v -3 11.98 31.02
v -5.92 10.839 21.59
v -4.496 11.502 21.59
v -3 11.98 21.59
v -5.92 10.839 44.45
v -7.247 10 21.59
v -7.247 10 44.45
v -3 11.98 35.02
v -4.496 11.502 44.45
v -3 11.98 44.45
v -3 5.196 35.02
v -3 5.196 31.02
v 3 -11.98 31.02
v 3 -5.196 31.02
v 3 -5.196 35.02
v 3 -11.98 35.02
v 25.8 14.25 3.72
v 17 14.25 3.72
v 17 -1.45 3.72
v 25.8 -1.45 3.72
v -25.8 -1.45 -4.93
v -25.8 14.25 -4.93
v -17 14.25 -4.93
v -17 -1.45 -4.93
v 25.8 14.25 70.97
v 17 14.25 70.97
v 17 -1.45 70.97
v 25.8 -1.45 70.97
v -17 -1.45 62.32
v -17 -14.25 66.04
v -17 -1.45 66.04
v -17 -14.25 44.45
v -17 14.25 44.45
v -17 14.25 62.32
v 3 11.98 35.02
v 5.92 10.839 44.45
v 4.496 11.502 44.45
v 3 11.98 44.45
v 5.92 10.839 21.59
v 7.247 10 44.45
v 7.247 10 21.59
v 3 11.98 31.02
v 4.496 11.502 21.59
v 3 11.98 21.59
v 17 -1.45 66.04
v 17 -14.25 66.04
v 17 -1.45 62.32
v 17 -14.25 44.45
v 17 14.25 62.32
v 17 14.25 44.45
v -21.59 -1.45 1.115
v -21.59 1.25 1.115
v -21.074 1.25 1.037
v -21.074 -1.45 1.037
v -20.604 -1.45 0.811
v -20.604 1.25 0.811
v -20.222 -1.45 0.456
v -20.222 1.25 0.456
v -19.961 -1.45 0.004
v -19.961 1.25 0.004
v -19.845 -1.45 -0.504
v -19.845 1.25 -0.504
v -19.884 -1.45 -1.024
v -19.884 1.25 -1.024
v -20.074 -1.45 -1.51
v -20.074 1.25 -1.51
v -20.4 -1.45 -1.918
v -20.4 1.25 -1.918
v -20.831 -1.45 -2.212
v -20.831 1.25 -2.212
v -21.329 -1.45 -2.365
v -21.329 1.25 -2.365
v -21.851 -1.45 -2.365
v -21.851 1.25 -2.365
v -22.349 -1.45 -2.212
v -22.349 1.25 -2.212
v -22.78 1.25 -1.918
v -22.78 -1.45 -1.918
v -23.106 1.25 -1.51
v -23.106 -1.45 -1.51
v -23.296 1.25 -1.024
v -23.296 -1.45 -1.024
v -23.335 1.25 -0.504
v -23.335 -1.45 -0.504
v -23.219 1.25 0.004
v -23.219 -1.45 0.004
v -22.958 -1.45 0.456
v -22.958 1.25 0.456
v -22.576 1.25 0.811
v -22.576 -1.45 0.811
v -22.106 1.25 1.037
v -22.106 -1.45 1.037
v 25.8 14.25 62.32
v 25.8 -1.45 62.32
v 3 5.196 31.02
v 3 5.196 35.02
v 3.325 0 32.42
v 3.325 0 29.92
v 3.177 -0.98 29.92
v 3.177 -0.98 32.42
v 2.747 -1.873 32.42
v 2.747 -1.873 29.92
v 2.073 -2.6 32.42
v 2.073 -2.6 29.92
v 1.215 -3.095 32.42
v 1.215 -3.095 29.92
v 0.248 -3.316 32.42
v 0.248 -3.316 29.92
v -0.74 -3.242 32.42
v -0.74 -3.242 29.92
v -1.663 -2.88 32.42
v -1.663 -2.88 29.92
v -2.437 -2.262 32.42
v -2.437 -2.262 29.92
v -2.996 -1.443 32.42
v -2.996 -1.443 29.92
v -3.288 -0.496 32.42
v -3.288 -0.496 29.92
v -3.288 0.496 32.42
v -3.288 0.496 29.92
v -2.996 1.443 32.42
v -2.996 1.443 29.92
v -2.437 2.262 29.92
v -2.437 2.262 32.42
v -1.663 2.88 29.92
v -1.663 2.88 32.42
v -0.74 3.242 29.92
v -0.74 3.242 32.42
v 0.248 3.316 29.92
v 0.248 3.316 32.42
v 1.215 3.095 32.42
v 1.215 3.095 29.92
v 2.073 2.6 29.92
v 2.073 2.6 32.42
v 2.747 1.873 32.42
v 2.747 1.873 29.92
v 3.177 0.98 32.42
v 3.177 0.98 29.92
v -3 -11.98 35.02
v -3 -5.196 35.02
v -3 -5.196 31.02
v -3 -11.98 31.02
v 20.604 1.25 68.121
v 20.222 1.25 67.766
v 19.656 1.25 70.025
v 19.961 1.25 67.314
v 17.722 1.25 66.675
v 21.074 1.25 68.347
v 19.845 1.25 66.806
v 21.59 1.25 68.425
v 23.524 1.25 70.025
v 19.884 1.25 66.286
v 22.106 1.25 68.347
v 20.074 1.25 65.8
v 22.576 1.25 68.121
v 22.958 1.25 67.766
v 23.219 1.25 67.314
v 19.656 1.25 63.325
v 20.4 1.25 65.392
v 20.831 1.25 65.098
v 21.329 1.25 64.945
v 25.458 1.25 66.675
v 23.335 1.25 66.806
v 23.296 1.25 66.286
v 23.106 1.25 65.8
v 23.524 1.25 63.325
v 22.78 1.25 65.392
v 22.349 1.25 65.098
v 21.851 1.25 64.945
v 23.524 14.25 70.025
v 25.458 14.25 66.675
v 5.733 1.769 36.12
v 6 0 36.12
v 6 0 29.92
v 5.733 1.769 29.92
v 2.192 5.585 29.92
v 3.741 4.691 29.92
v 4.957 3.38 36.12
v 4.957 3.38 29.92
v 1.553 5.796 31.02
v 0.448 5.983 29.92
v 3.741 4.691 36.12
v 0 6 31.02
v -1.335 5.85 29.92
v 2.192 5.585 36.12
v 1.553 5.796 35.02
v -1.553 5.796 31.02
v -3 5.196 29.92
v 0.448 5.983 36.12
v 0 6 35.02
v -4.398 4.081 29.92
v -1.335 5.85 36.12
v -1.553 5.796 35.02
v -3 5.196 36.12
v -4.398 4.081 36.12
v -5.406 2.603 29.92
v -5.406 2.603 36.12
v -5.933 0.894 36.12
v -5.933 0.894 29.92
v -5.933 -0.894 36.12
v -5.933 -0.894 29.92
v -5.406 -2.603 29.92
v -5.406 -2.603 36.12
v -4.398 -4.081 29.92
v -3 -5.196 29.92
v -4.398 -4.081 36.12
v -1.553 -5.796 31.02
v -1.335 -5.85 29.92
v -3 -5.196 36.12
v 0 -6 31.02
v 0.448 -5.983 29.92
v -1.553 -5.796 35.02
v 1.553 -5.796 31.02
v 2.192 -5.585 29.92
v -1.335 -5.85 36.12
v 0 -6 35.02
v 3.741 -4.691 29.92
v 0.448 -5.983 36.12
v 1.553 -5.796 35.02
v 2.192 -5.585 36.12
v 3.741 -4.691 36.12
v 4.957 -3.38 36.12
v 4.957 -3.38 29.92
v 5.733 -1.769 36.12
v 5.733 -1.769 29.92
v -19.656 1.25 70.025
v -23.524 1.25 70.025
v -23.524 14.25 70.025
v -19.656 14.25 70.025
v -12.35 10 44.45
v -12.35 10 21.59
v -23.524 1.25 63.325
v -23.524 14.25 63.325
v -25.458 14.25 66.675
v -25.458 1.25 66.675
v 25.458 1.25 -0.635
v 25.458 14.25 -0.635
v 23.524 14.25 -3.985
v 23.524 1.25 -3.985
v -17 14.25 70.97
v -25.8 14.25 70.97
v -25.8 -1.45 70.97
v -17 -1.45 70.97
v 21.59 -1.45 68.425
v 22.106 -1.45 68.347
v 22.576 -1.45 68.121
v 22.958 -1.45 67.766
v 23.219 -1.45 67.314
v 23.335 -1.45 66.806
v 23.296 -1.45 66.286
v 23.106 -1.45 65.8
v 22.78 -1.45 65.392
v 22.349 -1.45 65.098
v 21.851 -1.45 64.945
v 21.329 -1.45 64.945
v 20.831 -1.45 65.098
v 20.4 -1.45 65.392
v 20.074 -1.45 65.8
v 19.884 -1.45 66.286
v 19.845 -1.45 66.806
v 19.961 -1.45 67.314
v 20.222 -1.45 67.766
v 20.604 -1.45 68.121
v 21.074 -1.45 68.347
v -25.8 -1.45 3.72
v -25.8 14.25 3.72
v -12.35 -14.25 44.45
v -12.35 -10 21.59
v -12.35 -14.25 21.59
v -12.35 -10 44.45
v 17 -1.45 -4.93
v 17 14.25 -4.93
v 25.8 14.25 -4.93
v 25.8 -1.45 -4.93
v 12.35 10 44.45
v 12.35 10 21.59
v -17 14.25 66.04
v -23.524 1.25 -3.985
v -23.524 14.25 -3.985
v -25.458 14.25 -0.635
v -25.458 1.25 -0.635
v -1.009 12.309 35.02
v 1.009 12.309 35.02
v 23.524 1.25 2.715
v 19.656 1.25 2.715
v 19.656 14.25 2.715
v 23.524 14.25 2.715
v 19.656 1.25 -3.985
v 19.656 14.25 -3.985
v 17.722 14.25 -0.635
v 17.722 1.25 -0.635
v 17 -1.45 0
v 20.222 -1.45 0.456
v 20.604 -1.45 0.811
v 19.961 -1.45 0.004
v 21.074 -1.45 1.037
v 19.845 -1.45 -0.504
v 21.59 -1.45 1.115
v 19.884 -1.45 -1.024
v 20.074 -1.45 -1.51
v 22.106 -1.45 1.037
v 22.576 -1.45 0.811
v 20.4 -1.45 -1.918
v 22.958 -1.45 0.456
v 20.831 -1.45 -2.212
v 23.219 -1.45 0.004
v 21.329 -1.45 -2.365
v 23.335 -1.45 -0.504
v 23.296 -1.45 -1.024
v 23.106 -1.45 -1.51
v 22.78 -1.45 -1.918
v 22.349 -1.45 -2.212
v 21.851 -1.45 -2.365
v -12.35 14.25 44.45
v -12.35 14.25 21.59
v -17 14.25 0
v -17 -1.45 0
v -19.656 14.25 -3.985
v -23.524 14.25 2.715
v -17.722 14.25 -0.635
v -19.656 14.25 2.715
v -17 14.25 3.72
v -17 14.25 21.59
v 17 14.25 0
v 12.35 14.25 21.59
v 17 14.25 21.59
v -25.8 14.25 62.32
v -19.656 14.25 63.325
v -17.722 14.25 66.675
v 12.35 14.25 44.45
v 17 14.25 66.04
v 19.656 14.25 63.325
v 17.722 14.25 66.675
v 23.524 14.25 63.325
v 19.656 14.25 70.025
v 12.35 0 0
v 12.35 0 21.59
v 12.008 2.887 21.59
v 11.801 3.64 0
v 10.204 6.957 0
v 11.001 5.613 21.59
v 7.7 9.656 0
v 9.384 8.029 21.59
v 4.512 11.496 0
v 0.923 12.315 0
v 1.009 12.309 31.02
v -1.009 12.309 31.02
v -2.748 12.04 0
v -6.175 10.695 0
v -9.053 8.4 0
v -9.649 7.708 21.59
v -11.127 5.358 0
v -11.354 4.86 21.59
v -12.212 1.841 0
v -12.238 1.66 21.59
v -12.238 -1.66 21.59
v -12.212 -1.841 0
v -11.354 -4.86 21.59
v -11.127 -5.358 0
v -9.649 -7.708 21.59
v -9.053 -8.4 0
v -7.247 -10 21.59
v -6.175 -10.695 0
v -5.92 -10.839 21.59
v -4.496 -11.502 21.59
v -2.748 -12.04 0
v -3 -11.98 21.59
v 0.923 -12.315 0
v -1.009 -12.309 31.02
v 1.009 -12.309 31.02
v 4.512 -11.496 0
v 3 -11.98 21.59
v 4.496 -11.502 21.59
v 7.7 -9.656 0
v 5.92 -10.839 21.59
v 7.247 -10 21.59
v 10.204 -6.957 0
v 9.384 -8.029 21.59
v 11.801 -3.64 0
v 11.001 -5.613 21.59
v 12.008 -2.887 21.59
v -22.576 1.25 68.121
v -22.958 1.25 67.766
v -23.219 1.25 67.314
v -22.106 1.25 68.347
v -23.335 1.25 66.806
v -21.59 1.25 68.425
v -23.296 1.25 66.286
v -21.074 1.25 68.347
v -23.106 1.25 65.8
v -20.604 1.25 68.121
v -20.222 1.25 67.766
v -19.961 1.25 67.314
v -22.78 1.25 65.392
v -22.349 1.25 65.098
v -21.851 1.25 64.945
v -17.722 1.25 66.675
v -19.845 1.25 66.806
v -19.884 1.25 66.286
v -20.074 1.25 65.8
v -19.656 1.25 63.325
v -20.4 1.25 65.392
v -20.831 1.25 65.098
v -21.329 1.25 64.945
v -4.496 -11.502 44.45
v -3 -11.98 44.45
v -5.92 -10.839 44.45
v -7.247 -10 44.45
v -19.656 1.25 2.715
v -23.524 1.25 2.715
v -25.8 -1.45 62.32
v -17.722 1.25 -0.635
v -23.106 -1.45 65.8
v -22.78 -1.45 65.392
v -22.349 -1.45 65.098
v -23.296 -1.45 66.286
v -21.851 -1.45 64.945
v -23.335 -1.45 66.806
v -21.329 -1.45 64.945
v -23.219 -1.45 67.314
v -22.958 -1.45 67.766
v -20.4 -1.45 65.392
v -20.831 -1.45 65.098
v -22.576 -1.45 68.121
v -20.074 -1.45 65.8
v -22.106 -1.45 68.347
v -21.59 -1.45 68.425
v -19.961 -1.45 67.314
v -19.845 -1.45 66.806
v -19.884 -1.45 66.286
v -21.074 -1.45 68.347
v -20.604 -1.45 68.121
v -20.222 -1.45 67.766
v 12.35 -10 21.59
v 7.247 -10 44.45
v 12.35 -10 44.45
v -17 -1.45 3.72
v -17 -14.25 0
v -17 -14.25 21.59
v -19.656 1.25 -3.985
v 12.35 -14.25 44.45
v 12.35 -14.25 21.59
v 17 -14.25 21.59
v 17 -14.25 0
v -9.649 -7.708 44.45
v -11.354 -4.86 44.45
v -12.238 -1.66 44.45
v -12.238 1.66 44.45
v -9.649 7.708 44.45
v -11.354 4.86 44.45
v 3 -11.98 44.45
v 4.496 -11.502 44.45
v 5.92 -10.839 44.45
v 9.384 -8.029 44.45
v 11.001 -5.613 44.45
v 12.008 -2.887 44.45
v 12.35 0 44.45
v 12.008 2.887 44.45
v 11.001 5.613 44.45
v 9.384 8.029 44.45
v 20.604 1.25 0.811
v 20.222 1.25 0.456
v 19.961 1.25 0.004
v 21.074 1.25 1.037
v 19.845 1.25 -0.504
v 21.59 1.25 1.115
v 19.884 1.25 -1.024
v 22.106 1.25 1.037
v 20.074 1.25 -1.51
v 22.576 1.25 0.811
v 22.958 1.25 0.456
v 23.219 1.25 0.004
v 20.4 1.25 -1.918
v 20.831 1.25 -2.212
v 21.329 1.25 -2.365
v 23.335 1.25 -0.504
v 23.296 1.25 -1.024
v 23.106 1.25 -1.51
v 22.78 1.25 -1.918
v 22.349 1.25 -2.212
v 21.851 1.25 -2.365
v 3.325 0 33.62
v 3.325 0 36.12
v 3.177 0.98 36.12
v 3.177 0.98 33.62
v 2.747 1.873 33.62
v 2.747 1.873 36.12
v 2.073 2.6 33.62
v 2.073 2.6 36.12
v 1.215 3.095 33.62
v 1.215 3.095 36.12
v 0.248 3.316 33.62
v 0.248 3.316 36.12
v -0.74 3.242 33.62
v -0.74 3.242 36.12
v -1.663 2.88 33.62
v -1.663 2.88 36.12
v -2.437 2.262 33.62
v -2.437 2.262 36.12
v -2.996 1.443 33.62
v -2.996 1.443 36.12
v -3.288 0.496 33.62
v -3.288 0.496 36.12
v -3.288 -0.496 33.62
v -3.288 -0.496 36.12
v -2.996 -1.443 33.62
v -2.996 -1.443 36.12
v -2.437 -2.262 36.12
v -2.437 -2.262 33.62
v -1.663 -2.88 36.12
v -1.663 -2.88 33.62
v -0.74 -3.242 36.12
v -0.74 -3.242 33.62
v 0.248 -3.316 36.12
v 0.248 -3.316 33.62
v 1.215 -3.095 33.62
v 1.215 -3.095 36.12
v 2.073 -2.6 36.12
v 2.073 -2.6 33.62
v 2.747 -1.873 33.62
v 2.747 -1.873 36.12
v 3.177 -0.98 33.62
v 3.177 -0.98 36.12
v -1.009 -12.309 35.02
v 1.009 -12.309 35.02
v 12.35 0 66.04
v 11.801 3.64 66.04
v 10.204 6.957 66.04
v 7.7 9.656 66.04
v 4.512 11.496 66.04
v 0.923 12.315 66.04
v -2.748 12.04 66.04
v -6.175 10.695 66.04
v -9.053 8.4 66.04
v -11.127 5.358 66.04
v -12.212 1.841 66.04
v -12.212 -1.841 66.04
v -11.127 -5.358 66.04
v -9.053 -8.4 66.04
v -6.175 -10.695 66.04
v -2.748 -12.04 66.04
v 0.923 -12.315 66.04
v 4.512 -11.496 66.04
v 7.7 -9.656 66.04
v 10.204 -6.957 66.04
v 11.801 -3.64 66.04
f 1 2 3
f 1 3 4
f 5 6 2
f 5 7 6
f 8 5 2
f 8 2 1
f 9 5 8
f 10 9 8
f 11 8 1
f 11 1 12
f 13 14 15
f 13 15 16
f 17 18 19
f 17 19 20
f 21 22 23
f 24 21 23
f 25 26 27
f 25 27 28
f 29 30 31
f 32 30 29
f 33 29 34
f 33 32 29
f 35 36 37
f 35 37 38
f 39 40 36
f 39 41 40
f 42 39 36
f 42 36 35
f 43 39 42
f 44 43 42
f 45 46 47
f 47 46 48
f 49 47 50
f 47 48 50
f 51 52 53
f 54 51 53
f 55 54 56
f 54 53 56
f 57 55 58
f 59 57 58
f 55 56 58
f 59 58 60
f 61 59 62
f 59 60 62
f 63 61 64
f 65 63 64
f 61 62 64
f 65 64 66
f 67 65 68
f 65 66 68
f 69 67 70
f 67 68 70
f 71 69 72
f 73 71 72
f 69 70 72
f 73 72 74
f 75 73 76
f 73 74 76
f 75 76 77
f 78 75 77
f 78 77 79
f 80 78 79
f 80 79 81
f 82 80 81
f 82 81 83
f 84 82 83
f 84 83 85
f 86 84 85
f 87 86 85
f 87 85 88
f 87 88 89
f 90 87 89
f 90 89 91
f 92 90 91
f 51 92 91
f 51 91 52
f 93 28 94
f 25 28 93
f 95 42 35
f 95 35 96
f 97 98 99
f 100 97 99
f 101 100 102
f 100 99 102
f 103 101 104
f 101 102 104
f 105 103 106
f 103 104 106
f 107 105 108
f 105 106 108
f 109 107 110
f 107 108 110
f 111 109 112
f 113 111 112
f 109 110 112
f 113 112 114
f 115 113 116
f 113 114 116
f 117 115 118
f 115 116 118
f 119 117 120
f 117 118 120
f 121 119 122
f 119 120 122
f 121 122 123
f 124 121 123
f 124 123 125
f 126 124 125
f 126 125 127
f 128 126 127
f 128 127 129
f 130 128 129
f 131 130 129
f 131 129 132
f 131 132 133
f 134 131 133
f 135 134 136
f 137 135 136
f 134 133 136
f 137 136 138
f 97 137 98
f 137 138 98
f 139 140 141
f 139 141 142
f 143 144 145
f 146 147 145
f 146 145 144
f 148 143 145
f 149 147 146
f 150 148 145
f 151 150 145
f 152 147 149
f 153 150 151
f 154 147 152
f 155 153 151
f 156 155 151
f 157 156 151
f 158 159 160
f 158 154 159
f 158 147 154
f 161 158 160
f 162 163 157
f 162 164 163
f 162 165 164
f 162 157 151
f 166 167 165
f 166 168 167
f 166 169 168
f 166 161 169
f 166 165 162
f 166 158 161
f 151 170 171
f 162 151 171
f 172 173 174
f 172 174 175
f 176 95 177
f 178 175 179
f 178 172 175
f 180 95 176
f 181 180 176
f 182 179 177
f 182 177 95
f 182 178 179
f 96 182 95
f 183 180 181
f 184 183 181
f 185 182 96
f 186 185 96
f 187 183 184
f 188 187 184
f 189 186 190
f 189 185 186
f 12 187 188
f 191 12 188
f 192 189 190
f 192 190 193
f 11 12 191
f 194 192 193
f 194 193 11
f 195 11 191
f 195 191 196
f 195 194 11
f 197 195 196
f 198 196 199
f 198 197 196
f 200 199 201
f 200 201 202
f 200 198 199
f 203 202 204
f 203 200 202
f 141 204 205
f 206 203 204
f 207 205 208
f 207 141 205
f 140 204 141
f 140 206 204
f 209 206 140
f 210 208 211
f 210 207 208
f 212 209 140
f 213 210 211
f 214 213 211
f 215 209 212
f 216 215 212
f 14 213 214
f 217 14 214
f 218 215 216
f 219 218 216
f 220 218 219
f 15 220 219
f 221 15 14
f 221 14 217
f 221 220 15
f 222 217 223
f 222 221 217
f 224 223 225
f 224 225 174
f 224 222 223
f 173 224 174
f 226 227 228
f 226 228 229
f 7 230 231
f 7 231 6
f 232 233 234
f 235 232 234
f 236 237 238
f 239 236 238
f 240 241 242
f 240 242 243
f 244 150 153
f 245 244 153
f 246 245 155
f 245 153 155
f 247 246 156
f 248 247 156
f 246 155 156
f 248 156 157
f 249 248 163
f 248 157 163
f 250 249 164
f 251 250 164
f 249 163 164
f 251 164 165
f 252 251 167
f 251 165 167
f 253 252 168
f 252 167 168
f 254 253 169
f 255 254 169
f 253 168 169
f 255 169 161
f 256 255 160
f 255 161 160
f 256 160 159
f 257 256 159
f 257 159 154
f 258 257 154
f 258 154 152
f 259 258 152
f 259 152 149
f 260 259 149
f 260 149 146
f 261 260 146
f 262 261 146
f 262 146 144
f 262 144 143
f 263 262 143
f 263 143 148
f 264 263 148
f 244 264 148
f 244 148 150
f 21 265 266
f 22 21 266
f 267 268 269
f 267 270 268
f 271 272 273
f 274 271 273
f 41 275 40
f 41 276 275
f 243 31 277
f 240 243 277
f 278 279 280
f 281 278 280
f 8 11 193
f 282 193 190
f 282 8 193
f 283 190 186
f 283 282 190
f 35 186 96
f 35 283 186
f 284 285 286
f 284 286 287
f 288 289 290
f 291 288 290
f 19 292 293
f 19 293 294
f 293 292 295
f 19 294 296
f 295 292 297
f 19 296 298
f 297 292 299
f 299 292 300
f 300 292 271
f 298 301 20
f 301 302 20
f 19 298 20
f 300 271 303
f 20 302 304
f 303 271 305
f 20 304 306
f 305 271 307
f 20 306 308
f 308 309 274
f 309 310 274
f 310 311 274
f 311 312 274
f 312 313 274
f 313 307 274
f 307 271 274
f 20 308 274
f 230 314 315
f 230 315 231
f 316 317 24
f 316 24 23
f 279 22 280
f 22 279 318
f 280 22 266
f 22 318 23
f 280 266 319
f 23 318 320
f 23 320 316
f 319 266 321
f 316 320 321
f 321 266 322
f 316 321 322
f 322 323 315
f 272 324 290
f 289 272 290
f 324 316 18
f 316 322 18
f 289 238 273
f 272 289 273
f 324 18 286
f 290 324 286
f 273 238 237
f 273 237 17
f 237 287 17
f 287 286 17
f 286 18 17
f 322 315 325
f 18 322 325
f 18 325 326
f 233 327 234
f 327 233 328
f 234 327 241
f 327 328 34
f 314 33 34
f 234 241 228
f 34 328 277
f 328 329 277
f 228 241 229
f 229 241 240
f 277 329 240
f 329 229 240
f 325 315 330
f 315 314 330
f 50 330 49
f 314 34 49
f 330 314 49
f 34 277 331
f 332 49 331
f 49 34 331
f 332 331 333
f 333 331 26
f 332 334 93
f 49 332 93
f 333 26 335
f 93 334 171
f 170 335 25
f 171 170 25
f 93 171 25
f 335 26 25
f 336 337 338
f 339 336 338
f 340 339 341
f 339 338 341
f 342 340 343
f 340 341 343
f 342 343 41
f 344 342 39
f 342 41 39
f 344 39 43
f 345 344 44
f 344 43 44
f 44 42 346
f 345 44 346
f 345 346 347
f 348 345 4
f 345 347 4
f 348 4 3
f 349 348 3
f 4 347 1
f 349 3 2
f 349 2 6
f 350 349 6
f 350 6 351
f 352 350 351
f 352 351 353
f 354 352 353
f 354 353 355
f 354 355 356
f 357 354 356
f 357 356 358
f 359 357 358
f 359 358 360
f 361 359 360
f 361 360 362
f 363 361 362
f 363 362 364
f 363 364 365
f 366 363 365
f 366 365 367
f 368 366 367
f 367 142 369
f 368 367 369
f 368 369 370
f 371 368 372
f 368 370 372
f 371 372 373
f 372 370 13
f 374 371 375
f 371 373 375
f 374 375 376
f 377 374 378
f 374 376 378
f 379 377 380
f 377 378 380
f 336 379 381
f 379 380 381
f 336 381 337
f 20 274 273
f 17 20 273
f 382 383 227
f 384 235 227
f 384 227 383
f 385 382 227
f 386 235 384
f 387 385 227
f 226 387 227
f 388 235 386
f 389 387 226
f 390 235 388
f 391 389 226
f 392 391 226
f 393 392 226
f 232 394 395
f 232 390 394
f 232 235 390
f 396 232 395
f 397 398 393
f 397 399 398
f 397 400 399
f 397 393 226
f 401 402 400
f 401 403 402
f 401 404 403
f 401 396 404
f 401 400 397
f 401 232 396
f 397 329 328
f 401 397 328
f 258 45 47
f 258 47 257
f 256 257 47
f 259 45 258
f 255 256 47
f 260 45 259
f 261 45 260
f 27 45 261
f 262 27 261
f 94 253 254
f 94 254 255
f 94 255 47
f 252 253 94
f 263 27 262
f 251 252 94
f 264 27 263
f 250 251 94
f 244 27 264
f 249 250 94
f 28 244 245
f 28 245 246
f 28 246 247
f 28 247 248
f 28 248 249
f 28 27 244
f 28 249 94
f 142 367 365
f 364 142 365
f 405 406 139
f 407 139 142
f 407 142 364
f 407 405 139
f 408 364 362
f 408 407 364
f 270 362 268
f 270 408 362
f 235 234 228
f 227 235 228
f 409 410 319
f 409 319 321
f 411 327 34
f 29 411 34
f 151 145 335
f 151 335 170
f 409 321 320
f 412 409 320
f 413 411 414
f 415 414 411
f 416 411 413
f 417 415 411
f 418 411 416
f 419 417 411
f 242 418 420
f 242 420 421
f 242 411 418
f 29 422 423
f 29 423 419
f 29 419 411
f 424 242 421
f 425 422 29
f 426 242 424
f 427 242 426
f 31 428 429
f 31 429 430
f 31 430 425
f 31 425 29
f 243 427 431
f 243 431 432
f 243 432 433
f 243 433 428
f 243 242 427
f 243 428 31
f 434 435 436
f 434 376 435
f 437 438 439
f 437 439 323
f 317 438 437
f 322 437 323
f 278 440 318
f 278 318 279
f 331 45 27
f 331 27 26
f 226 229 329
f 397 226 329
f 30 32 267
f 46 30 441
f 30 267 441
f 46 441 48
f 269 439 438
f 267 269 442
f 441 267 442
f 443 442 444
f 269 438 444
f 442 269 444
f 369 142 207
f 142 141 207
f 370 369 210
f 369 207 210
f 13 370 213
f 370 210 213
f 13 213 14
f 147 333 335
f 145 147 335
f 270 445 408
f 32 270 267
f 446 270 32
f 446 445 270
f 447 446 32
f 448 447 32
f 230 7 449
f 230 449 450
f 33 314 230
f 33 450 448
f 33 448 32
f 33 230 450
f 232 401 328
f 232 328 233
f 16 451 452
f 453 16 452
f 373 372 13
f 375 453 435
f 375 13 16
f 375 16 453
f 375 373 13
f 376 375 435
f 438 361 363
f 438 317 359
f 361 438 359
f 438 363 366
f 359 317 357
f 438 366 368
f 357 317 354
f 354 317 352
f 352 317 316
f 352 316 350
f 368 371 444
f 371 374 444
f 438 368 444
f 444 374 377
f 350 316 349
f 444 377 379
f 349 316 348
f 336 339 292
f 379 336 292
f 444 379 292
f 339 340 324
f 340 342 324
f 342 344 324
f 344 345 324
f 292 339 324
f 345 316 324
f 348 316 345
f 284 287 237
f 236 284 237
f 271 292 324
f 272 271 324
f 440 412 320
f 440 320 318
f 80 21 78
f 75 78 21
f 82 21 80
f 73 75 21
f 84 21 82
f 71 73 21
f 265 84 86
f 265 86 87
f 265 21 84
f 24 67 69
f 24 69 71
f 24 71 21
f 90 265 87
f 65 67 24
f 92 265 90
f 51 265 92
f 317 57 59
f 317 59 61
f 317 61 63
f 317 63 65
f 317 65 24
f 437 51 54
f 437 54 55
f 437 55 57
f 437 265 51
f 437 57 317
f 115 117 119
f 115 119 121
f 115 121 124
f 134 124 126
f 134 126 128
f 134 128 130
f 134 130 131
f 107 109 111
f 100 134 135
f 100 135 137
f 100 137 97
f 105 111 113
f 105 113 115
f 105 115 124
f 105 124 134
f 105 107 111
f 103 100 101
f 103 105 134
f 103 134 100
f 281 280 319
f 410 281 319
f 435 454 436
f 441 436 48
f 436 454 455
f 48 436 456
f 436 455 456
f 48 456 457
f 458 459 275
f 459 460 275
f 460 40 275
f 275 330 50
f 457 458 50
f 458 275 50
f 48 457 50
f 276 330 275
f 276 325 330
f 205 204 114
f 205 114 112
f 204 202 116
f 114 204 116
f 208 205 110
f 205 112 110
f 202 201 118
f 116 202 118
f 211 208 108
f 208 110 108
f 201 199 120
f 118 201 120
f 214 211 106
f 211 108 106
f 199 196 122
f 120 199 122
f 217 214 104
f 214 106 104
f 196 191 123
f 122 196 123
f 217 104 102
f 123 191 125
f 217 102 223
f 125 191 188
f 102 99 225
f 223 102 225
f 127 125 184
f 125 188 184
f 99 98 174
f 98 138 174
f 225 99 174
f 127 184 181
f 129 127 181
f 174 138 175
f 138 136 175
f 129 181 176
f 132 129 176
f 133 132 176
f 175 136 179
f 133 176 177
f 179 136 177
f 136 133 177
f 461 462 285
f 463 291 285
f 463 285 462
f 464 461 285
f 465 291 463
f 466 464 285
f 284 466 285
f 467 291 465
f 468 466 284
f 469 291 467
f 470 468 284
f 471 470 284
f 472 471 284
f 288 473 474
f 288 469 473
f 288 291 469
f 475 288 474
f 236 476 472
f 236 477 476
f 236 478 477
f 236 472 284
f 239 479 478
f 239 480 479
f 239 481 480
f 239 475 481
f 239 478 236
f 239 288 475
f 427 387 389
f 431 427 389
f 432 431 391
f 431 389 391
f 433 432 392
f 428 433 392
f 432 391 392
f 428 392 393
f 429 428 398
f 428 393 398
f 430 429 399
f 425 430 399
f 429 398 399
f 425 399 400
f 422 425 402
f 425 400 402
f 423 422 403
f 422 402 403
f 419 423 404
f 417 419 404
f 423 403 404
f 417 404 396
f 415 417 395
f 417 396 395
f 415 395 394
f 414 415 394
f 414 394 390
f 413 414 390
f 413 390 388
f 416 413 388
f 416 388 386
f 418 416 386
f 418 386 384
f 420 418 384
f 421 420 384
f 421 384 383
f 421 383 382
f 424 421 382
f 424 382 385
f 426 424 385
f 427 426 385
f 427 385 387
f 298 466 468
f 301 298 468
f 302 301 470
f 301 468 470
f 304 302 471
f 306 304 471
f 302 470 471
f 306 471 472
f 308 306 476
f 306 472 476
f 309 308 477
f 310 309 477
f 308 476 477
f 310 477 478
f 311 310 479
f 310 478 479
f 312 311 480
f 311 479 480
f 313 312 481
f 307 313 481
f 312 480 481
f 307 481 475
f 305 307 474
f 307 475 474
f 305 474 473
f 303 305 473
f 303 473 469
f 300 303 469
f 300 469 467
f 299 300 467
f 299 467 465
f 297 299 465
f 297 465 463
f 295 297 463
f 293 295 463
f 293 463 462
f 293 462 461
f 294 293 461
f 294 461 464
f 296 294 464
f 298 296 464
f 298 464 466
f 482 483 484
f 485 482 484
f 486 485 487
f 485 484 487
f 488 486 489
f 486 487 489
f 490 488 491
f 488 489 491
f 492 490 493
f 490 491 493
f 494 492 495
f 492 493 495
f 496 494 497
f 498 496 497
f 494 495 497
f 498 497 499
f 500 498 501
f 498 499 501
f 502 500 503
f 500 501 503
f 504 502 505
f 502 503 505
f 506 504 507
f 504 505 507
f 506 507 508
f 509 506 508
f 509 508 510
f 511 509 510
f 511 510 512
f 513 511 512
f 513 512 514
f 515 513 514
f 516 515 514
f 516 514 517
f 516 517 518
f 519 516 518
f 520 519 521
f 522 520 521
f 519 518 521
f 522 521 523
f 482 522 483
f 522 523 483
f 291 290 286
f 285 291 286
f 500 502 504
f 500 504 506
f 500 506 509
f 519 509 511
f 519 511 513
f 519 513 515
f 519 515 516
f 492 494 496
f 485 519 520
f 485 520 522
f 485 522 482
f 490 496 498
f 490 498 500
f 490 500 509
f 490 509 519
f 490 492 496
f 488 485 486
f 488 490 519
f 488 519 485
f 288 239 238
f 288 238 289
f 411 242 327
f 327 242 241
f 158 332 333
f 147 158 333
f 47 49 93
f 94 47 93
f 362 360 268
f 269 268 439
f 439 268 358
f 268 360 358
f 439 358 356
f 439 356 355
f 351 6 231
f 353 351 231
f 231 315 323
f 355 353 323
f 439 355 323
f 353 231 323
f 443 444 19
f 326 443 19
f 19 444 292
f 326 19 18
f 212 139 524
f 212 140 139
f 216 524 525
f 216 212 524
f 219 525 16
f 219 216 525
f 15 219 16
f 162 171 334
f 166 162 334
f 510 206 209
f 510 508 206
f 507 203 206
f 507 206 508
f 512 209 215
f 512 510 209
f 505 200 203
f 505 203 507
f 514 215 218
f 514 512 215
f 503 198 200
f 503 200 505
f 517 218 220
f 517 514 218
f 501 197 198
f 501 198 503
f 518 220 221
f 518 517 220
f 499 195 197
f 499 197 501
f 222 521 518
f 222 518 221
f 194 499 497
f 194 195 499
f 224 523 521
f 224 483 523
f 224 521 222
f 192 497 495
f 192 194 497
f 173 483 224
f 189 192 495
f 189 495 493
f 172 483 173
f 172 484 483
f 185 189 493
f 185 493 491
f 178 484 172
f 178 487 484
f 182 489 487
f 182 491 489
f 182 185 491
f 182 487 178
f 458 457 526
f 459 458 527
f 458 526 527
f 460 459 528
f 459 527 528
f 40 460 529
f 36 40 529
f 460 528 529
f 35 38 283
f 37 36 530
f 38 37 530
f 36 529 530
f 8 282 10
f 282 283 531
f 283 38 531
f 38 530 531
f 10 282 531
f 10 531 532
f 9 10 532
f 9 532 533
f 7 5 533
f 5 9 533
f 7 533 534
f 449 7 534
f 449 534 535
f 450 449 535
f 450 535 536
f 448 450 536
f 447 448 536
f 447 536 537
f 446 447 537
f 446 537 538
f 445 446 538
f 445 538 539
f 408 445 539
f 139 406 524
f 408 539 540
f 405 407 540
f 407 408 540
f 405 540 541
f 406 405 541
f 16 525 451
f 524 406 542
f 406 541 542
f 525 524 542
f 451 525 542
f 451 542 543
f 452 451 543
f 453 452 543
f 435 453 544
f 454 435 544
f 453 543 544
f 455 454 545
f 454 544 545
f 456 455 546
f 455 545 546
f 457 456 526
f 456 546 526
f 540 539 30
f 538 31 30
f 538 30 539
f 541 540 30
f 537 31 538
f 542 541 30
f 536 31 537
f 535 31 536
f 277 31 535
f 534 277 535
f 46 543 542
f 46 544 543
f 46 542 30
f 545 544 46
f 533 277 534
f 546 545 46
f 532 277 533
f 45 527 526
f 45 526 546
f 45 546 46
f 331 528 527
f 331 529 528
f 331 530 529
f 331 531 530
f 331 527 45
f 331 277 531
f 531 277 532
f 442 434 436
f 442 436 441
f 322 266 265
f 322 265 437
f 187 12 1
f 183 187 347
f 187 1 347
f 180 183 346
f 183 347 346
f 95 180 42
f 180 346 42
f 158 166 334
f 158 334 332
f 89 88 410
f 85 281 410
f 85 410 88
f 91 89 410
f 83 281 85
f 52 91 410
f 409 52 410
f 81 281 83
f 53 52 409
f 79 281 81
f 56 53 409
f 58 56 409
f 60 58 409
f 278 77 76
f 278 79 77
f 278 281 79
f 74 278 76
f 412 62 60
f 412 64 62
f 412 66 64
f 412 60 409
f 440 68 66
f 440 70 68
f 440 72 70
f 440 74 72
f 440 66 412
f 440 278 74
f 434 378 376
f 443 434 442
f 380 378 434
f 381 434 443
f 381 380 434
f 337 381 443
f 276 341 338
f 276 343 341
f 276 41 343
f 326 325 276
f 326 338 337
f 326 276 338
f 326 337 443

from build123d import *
from build123d.topology import SkipClean

# Parameters (mm, degrees)
SKETCH1_W                = 34
SKETCH1_H                = 28.5
BOSS_EXTRUDE1_DEPTH      = 66.04
SKETCH3_R                = 12.35
CUT_EXTRUDE1_DEPTH       = 70.665946488
SKETCH7_W                = 8.8
SKETCH7_H                = 15.7
BOSS_EXTRUDE2_DEPTH      = 4.93
BOSS_EXTRUDE2_DEPTH_BACK = 3.72
SKETCH10_W               = 8.8
SKETCH10_H               = 15.7
BOSS_EXTRUDE3_DEPTH      = 3.72
BOSS_EXTRUDE3_DEPTH_BACK = 4.93
CUT_EXTRUDE5_DEPTH       = 13
SKETCH11_R               = 12.35
BOSS_EXTRUDE4_DEPTH      = 2
CUT_EXTRUDE7_DEPTH       = 11.43
SKETCH14_R               = 6
BOSS_EXTRUDE5_DEPTH      = 3.1
SKETCH15_R               = 3.325
CUT_EXTRUDE8_DEPTH       = 2.5
SKETCH16_R               = 3.325
CUT_EXTRUDE9_DEPTH       = 2.5
SKETCH25_R               = 1.75
CUT_EXTRUDE17_DEPTH      = 50


with BuildPart() as part:
    # Sketch1 → Boss-Extrude1 (new body)
    with BuildSketch(Plane.XY):
        Rectangle(SKETCH1_W, SKETCH1_H)
    extrude(amount=BOSS_EXTRUDE1_DEPTH)

    # Sketch3 → Cut-Extrude1 (cut, through all)
    with BuildSketch(Plane.XY.offset(66.04)):
        Circle(SKETCH3_R)
    extrude(amount=-CUT_EXTRUDE1_DEPTH, mode=Mode.SUBTRACT)

    # Sketch7 → Boss-Extrude2 (add, two sides)
    with BuildSketch(Plane.XY.offset(66.04)) as boss_extrude2_sk:
        with Locations((-21.4, 6.4)):
            Rectangle(SKETCH7_W, SKETCH7_H)
        with Locations((21.4, 6.4)):
            Rectangle(SKETCH7_W, SKETCH7_H)
    extrude(amount=BOSS_EXTRUDE2_DEPTH)
    extrude(boss_extrude2_sk.sketch, amount=-BOSS_EXTRUDE2_DEPTH_BACK)

    # Sketch10 → Boss-Extrude3 (add, two sides)
    with BuildSketch(Plane.XY) as boss_extrude3_sk:
        with Locations((-21.4, 6.4)):
            Rectangle(SKETCH10_W, SKETCH10_H)
        with Locations((21.4, 6.4)):
            Rectangle(SKETCH10_W, SKETCH10_H)
    extrude(amount=BOSS_EXTRUDE3_DEPTH)
    extrude(boss_extrude3_sk.sketch, amount=-BOSS_EXTRUDE3_DEPTH_BACK)

    # Sketch8 → Cut-Extrude5 (cut)
    with BuildSketch(Plane(origin=(0, 14.25, 0), x_dir=(1, 0, 0), z_dir=(0, 1, 0))):
        Polygon((-25.458246804, 0.635), (-23.524123402, -2.715), (-19.655876598, -2.715), (-17.721753196, 0.635), (-19.655876598, 3.985), (-23.524123402, 3.985), align=None)
        Polygon((-17.721753196, -66.675), (-19.655876598, -63.325), (-23.524123402, -63.325), (-25.458246804, -66.675), (-23.524123402, -70.025), (-19.655876598, -70.025), align=None)
        Polygon((17.721753196, -66.675), (19.655876598, -70.025), (23.524123402, -70.025), (25.458246804, -66.675), (23.524123402, -63.325), (19.655876598, -63.325), align=None)
        Polygon((25.458246804, 0.635), (23.524123402, 3.985), (19.655876598, 3.985), (17.721753196, 0.635), (19.655876598, -2.715), (23.524123402, -2.715), align=None)
    extrude(amount=-CUT_EXTRUDE5_DEPTH, mode=Mode.SUBTRACT)


with BuildPart() as body_2:
    # Sketch11 → Boss-Extrude4 (new, symmetric)
    with BuildSketch(Plane.XY.offset(33.02)):
        Circle(SKETCH11_R)
    extrude(amount=BOSS_EXTRUDE4_DEPTH, both=True)


with BuildPart() as cut_extrude7_tool:
    # Sketch13 → Cut-Extrude7 (new, symmetric)
    with SkipClean():  # the faces are left unmerged after this step: merging them gives an invalid solid
        with BuildSketch(Plane.XY.offset(33.02)):
            with BuildLine():
                Line((17, -14.25), (17, 14.25))
                Line((17, 14.25), (12.35, 14.25))
                Line((12.35, 14.25), (12.35, 10))
                Line((12.35, 10), (7.247240854, 10))
                ThreePointArc((7.247240854, 10), (5.218397556, 11.193338508), (3, 11.980087646))
                Line((3, 11.980087646), (3, 0))
                Line((3, 0), (3, -11.980087646))
                ThreePointArc((3, -11.980087646), (5.218397556, -11.193338508), (7.247240854, -10))
                Line((7.247240854, -10), (12.35, -10))
                Line((12.35, -10), (12.35, -14.25))
                Line((12.35, -14.25), (17, -14.25))
            make_face()
            with BuildLine():
                Line((-12.35, 10), (-7.247240854, 10))
                ThreePointArc((-7.247240854, 10), (-5.218397556, 11.193338508), (-3, 11.980087646))
                Line((-3, 11.980087646), (-3, 0))
                Line((-3, 0), (-3, -11.980087646))
                ThreePointArc((-3, -11.980087646), (-5.218397556, -11.193338508), (-7.247240854, -10))
                Line((-7.247240854, -10), (-12.35, -10))
                Line((-12.35, -10), (-12.35, -14.25))
                Line((-12.35, -14.25), (-17, -14.25))
                Line((-17, -14.25), (-17, 14.25))
                Line((-17, 14.25), (-12.35, 14.25))
                Line((-12.35, 14.25), (-12.35, 10))
            make_face()
        extrude(amount=CUT_EXTRUDE7_DEPTH, both=True)


with BuildPart() as part_1:
    with SkipClean():  # the faces are left unmerged after this step: merging them gives an invalid solid
        add(part.part)

        # Cut-Extrude7: cut by cut_extrude7_tool
        add(cut_extrude7_tool.part, mode=Mode.SUBTRACT)



with BuildPart() as body_2_1:
    with SkipClean():  # the faces are left unmerged after this step: merging them gives an invalid solid
        add(body_2.part)

        # Cut-Extrude7: cut by cut_extrude7_tool
        add(cut_extrude7_tool.part, mode=Mode.SUBTRACT)


with BuildPart() as part_2:
    with SkipClean():  # the faces are left unmerged after this step: merging them gives an invalid solid
        add(part_1.part)

        add(body_2_1.part)  # Boss-Extrude5 merges body 2
        # Sketch14 → Boss-Extrude5 (add, symmetric)
        with BuildSketch(Plane.XY.offset(33.02)):
            Circle(SKETCH14_R)
        extrude(amount=BOSS_EXTRUDE5_DEPTH, both=True)

    # Sketch15 → Cut-Extrude8 (cut)
    with SkipClean():  # the faces are left unmerged after this step: merging them gives an invalid solid
        with BuildSketch(Plane.XY.offset(36.12)):
            Circle(SKETCH15_R)
        extrude(amount=-CUT_EXTRUDE8_DEPTH, mode=Mode.SUBTRACT)

    # Sketch16 → Cut-Extrude9 (cut)
    with SkipClean():  # the faces are left unmerged after this step: merging them gives an invalid solid
        with BuildSketch(Plane(origin=(0, 0, 29.92), x_dir=(-1, 0, 0), z_dir=(0, 0, -1))):
            with Locations(Location((0, 0, 0), (0, 0, 180))):
                Circle(SKETCH16_R)
        extrude(amount=-CUT_EXTRUDE9_DEPTH, mode=Mode.SUBTRACT)

    # Sketch25 → Cut-Extrude17 (cut)
    with SkipClean():  # the faces are left unmerged after this step: merging them gives an invalid solid
        with BuildSketch(Plane(origin=(132.323959999, 1.25, 1.846345109), x_dir=(1, 0, 0), z_dir=(0, 1, 0))):
            with Locations(Location((-110.733959999, 2.481345109, 0), (0, 0, 270))):
                Circle(SKETCH25_R)
            with Locations(Location((-110.733959999, -64.828654891, 0), (0, 0, 270))):
                Circle(SKETCH25_R)
            with Locations(Location((-153.913959999, -64.828654891, 0), (0, 0, 270))):
                Circle(SKETCH25_R)
            with Locations(Location((-153.913959999, 2.481345109, 0), (0, 0, 270))):
                Circle(SKETCH25_R)
        extrude(amount=-CUT_EXTRUDE17_DEPTH, mode=Mode.SUBTRACT)


solid = part_2.part
